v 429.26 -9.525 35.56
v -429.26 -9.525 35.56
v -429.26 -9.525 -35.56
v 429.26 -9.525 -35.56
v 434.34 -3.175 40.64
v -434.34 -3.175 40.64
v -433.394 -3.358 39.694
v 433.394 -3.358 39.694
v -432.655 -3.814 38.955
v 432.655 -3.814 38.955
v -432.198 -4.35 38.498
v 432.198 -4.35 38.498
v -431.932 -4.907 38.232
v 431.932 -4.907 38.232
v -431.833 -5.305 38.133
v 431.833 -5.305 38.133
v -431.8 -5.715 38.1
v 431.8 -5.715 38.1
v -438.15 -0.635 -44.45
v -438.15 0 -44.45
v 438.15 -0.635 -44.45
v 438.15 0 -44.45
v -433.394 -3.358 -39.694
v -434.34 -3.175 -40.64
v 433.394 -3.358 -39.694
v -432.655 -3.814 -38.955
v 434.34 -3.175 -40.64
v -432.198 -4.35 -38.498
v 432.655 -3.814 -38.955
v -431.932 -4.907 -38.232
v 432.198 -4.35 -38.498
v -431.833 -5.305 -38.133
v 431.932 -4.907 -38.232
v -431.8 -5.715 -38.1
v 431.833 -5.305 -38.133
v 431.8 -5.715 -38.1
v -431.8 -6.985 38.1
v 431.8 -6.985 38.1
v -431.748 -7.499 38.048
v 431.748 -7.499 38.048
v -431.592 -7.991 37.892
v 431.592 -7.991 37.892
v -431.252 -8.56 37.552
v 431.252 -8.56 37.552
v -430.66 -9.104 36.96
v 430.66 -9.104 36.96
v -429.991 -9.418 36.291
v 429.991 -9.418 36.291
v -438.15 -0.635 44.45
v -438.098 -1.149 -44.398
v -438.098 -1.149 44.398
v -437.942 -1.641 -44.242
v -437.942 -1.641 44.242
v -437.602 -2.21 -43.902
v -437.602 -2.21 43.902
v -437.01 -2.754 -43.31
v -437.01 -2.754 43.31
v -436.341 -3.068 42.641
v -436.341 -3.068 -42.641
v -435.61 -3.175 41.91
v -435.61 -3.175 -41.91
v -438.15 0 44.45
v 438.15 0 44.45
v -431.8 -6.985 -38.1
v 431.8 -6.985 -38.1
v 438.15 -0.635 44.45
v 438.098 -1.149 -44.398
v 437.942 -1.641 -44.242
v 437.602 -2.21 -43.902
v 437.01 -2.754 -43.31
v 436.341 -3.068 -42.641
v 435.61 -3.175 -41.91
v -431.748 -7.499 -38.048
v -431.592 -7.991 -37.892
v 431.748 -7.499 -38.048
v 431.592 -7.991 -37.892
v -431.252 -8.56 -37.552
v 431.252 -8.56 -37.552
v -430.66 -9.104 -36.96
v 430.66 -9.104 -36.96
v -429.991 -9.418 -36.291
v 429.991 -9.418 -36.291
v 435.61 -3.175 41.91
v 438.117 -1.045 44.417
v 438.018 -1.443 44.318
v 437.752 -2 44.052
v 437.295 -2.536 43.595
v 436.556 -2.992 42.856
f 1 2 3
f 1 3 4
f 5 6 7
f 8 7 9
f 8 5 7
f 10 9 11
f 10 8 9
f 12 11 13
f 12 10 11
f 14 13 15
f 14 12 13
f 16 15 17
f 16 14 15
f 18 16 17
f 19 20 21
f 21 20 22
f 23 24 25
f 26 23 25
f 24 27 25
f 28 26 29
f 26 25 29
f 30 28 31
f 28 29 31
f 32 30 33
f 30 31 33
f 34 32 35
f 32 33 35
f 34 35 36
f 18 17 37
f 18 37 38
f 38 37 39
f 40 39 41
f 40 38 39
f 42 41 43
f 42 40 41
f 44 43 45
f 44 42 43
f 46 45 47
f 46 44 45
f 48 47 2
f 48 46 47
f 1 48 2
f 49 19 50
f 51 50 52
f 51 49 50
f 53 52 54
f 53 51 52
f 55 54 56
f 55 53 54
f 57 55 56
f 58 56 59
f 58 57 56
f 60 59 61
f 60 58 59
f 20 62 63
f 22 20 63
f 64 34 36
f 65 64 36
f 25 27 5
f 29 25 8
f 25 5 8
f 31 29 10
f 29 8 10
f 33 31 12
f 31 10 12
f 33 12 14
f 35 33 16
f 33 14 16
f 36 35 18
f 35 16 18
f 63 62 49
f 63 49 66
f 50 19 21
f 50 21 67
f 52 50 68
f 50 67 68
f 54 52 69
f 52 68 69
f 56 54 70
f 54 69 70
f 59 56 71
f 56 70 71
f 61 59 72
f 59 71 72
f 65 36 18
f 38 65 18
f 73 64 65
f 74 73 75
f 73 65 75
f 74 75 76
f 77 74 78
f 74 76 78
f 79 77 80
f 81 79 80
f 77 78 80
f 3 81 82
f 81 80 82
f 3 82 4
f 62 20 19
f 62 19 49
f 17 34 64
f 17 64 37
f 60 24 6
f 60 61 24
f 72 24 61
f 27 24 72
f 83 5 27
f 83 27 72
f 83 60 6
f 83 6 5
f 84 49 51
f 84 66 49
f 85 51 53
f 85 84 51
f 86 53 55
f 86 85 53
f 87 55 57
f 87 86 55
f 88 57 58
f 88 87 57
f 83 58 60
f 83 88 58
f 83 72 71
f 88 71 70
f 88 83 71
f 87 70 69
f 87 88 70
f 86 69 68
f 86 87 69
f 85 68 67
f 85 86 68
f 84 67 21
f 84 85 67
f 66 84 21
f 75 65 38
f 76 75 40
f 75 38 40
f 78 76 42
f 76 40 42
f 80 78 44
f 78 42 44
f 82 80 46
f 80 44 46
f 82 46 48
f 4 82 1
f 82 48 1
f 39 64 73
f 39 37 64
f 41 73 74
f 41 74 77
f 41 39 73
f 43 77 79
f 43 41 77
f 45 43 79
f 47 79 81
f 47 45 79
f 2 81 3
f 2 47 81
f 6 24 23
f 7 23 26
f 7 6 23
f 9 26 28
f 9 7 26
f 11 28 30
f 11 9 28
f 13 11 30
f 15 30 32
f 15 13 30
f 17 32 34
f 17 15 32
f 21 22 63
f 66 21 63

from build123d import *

# Parameters (mm, degrees)
F0_W     = 863.6
F0_H     = 76.2
F1_DEPTH = 9.525
F0_W_2   = 876.3
F0_H_2   = 88.9
F2_DEPTH = 3.175
F3_R     = 2.54


with BuildPart() as f1:
    # F0 (on Front) → F1 (new body)
    with BuildSketch(Plane.XZ):
        Rectangle(F0_W, F0_H)
    extrude(amount=F1_DEPTH)

    # F0 (on Front) → F2 (join)
    with BuildSketch(Plane.XZ):
        Rectangle(F0_W_2, F0_H_2)
        Rectangle(F0_W, F0_H, mode=Mode.SUBTRACT)
    extrude(amount=F2_DEPTH)

    # F3
    f3_edges = [f1.edges().sort_by_distance(p)[0] for p in [
        (431.8, -9.525, 0),
        (0, -9.525, 38.1),
        (-431.8, -9.525, 0),
        (0, -9.525, -38.1),
        (-438.15, -3.175, 0),
        (0, -3.175, -44.45),
        (438.15, -3.175, 0),
        (0, -3.175, 44.45),
        (-431.8, -3.175, 0),
        (0, -3.175, 38.1),
        (431.8, -3.175, 0),
        (0, -3.175, -38.1),
    ]]
    fillet(f3_edges, radius=F3_R)


solid = f1.part
